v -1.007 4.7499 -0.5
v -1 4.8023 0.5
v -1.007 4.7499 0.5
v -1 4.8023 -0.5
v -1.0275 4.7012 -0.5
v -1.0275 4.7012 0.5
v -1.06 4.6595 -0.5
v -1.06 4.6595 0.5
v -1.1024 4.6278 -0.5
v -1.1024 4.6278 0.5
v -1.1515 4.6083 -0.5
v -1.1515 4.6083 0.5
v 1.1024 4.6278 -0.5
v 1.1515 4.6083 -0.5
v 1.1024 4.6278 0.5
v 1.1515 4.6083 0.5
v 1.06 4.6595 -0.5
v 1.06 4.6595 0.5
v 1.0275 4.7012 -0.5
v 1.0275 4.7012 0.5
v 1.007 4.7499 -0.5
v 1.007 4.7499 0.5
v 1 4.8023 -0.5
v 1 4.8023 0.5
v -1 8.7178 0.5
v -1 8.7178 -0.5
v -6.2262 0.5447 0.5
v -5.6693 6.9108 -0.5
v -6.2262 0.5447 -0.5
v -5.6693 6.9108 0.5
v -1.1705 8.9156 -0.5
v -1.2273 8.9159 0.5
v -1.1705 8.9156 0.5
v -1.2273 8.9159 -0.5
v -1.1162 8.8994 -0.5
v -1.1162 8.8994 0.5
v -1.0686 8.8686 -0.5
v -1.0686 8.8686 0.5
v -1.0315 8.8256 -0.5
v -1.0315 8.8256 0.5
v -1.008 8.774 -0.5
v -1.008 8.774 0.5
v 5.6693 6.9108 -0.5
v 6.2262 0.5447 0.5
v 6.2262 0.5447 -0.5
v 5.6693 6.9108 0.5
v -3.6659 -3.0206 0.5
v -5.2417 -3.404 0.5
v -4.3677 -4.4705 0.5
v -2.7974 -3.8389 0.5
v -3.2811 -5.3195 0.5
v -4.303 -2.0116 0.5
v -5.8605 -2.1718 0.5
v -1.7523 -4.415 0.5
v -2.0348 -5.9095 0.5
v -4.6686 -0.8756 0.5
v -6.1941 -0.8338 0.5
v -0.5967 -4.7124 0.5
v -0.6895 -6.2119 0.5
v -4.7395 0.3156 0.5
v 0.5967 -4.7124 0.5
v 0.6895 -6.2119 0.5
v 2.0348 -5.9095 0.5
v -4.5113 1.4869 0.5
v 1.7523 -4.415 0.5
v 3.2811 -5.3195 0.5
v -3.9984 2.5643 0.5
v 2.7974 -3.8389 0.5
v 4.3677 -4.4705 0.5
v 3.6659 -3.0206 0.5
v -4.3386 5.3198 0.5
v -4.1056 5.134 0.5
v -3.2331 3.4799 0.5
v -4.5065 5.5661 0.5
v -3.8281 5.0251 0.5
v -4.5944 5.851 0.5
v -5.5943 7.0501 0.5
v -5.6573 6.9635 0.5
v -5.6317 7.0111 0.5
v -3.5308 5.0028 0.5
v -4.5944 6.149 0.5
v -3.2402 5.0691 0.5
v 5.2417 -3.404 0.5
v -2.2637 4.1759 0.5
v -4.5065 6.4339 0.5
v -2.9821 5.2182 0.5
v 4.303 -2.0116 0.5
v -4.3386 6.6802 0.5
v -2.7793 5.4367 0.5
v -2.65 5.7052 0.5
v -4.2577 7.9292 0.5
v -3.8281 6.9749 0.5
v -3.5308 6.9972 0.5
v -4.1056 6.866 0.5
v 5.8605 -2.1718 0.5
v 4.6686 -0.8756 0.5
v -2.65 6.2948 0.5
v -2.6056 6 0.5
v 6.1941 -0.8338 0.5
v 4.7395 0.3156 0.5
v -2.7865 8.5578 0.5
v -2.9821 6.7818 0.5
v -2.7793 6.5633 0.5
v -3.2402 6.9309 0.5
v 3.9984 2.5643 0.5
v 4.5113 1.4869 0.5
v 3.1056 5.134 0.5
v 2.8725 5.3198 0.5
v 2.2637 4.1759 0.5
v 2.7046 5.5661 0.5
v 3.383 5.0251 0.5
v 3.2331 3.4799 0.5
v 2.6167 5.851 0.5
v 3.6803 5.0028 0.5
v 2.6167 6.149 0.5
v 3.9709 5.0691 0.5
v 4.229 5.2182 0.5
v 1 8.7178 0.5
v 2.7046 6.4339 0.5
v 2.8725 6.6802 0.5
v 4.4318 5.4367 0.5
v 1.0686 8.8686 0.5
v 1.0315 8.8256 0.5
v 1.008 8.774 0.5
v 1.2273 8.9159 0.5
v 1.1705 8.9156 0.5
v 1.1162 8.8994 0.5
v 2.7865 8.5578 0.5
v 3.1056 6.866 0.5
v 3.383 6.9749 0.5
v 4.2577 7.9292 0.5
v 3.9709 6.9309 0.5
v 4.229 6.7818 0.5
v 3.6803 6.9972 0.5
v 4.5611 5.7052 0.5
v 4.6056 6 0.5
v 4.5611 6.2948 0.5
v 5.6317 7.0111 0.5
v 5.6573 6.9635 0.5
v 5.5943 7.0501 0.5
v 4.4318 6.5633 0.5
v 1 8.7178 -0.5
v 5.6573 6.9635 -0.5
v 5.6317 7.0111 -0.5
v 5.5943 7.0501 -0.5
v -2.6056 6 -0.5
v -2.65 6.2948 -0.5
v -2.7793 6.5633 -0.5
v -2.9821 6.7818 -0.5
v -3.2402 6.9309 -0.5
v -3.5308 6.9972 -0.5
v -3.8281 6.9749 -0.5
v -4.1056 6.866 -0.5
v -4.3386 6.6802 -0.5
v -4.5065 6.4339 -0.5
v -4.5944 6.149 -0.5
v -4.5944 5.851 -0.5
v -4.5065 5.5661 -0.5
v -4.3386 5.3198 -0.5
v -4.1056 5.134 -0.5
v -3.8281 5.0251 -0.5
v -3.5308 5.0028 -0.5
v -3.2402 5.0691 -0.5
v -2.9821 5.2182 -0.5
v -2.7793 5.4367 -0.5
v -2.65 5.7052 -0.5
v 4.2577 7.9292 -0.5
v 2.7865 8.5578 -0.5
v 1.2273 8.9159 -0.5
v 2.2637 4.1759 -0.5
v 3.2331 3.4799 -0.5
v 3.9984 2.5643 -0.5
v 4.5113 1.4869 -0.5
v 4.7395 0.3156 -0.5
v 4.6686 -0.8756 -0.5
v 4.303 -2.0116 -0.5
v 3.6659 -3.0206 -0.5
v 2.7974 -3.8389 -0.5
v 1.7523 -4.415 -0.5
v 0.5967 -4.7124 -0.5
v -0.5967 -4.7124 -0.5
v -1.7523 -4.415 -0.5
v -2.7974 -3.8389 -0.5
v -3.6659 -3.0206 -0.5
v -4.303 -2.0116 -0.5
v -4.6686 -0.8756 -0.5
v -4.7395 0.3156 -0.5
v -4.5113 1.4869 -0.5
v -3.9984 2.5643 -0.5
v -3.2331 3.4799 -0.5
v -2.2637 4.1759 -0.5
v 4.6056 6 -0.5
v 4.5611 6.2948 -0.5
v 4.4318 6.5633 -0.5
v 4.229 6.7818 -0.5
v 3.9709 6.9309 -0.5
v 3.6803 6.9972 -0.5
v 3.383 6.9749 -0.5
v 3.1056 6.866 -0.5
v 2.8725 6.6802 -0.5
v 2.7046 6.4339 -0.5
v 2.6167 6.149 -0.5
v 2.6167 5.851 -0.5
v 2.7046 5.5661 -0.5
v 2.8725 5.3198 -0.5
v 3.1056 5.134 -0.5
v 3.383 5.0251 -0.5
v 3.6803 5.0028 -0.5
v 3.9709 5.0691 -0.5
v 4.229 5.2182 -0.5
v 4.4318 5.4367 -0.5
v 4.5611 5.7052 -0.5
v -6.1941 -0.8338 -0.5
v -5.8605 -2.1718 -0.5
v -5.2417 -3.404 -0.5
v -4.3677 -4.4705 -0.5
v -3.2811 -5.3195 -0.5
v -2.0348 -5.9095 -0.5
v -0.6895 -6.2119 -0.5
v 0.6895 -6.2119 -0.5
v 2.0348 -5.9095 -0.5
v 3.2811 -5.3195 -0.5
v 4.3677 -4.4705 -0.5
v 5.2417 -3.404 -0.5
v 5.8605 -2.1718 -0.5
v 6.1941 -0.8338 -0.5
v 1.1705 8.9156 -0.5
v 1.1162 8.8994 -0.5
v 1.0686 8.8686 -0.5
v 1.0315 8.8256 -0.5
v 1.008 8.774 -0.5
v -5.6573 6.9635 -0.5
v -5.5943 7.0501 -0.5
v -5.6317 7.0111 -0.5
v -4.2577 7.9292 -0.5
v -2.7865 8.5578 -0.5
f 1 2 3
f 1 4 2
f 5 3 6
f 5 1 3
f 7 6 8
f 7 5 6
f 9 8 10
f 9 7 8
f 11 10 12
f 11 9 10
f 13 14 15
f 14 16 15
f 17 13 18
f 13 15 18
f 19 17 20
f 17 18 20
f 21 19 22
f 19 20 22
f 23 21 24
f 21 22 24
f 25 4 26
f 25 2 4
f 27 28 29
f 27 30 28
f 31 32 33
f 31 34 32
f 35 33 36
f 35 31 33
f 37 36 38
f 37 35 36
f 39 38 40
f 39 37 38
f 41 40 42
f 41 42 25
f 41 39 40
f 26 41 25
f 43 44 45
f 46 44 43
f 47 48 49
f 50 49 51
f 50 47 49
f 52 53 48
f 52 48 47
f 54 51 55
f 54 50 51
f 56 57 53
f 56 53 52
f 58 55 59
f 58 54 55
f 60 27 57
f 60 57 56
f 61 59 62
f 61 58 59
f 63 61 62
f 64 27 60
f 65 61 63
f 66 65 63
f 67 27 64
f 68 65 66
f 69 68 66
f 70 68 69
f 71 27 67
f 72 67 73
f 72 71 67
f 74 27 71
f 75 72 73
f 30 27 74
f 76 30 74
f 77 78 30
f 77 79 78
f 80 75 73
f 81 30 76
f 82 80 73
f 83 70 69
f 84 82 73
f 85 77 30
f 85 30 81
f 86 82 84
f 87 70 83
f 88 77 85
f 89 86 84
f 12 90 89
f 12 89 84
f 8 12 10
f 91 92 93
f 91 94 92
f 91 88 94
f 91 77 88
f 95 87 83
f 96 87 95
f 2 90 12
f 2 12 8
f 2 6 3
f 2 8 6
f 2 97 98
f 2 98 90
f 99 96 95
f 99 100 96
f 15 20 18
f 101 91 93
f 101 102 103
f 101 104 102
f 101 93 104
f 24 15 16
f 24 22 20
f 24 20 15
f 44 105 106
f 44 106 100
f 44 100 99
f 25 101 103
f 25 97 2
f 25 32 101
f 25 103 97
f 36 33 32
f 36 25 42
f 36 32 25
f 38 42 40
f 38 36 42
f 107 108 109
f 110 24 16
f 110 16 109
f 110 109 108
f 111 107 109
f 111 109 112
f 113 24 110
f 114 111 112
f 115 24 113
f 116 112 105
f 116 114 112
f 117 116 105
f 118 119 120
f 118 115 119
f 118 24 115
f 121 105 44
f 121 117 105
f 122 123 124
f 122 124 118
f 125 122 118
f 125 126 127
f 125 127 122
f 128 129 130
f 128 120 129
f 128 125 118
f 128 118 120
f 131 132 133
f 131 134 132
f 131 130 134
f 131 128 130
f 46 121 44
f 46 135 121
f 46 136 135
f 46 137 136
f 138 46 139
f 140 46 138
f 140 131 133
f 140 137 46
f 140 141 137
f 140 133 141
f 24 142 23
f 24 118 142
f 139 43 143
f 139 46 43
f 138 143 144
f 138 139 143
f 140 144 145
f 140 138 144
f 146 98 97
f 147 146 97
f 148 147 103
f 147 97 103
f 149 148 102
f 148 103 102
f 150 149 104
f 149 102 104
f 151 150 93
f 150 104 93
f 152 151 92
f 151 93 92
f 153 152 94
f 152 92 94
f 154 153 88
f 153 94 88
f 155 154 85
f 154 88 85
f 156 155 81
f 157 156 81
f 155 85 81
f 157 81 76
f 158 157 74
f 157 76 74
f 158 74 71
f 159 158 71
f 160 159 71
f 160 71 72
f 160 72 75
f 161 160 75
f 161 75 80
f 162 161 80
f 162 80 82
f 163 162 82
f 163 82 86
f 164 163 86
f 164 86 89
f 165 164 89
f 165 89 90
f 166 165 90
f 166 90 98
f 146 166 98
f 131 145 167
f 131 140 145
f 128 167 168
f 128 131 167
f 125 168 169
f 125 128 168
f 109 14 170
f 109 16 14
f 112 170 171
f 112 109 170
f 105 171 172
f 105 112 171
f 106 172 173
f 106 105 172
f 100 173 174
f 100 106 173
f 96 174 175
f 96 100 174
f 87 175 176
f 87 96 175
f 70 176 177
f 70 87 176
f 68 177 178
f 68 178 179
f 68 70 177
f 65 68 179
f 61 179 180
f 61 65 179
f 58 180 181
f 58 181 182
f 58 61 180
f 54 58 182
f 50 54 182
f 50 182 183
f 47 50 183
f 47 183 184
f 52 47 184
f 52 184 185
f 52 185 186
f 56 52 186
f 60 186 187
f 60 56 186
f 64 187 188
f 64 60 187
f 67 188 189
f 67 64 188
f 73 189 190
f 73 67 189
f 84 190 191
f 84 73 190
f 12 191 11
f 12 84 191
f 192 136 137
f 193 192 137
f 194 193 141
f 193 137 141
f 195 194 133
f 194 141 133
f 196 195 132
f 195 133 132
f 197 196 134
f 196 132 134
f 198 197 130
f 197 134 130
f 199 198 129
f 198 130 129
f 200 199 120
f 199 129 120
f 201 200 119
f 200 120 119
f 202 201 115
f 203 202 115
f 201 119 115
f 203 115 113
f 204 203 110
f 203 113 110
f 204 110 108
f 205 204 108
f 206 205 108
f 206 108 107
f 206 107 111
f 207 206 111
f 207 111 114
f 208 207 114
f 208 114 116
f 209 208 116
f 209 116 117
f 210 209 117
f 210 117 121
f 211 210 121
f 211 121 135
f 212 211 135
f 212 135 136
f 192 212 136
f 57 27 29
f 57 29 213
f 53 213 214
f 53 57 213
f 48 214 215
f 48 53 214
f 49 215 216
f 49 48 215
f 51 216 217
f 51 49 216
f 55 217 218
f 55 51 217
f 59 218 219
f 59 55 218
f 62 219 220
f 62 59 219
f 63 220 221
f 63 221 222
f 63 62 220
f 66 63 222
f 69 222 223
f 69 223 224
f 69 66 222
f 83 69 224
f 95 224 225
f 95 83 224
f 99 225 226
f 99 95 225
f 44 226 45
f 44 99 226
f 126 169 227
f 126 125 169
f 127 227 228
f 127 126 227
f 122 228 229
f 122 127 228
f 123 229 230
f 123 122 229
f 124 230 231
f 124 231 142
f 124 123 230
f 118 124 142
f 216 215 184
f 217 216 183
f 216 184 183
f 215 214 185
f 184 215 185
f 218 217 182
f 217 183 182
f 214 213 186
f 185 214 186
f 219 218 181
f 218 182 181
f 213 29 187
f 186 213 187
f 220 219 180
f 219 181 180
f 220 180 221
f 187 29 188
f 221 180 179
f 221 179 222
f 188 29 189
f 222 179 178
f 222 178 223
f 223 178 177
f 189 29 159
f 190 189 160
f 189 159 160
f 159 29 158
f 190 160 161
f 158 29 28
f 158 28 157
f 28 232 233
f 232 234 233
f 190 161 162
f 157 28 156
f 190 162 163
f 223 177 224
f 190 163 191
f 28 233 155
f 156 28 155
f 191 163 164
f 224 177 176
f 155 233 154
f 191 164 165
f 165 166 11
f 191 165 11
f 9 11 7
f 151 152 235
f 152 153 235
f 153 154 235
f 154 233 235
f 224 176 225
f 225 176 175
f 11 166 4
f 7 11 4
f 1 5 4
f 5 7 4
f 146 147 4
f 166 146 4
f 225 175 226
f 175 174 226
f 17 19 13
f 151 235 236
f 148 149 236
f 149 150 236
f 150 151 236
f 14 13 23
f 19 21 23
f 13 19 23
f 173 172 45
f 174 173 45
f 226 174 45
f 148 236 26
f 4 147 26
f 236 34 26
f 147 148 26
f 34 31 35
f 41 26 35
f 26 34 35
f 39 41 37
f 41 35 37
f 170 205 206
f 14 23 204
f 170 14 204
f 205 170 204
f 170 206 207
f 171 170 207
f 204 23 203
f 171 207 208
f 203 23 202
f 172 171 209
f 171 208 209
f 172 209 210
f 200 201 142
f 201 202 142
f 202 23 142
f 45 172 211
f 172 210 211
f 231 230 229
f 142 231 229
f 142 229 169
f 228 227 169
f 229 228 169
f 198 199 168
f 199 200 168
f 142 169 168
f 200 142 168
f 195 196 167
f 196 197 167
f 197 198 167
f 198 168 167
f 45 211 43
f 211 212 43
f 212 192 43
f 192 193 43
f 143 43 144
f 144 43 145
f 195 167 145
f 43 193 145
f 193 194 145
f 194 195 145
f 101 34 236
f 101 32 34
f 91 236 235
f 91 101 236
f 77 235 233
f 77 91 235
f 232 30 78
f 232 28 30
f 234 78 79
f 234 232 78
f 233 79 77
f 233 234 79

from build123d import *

# Parameters (mm, degrees)
BOSS_EXTRUDE1_DEPTH = 0.5
SKETCH2_R           = 1
CUT_EXTRUDE1_DEPTH  = 11.9573035
FILLET1_R           = 0.2


with BuildPart() as part:
    # Sketch1 → Boss-Extrude1 (new, symmetric)
    with BuildSketch(Plane.XY):
        with BuildLine():
            Line((-5.661803514, 6.995997497), (-6.226216863, 0.544723392))
            ThreePointArc((-6.226216863, 0.544723392), (0, -6.25), (6.226216863, 0.544723392))
            Line((6.226216863, 0.544723392), (5.661803514, 6.995997497))
            ThreePointArc((5.661803514, 6.995997497), (3.470425019, 8.303983995), (1, 8.94427191))
            Line((1, 8.94427191), (1, 4.643543905))
            ThreePointArc((1, 4.643543905), (0, -4.75), (-1, 4.643543905))
            Line((-1, 4.643543905), (-1, 8.94427191))
            ThreePointArc((-1, 8.94427191), (-3.470425019, 8.303983995), (-5.661803514, 6.995997497))
        make_face()
    extrude(amount=BOSS_EXTRUDE1_DEPTH, both=True)

    # Sketch2 → Cut-Extrude1 (cut, through all)
    with BuildSketch(Plane.XY.offset(0.5)):
        with Locations((-3.605551275, 6)):
            Circle(SKETCH2_R)
        with Locations((3.605551275, 6)):
            Circle(SKETCH2_R)
    extrude(amount=-CUT_EXTRUDE1_DEPTH, mode=Mode.SUBTRACT)

    # Fillet1
    fillet1_edges = [part.edges().sort_by_distance(p)[0] for p in [
        (5.661803514, 6.995997497, 0),
        (-5.661803514, 6.995997497, 0),
        (-1, 8.94427191, 0),
        (-1, 4.643543905, 0),
        (1, 4.643543905, 0),
        (1, 8.94427191, 0),
    ]]
    fillet(fillet1_edges, radius=FILLET1_R)


solid = part.part
